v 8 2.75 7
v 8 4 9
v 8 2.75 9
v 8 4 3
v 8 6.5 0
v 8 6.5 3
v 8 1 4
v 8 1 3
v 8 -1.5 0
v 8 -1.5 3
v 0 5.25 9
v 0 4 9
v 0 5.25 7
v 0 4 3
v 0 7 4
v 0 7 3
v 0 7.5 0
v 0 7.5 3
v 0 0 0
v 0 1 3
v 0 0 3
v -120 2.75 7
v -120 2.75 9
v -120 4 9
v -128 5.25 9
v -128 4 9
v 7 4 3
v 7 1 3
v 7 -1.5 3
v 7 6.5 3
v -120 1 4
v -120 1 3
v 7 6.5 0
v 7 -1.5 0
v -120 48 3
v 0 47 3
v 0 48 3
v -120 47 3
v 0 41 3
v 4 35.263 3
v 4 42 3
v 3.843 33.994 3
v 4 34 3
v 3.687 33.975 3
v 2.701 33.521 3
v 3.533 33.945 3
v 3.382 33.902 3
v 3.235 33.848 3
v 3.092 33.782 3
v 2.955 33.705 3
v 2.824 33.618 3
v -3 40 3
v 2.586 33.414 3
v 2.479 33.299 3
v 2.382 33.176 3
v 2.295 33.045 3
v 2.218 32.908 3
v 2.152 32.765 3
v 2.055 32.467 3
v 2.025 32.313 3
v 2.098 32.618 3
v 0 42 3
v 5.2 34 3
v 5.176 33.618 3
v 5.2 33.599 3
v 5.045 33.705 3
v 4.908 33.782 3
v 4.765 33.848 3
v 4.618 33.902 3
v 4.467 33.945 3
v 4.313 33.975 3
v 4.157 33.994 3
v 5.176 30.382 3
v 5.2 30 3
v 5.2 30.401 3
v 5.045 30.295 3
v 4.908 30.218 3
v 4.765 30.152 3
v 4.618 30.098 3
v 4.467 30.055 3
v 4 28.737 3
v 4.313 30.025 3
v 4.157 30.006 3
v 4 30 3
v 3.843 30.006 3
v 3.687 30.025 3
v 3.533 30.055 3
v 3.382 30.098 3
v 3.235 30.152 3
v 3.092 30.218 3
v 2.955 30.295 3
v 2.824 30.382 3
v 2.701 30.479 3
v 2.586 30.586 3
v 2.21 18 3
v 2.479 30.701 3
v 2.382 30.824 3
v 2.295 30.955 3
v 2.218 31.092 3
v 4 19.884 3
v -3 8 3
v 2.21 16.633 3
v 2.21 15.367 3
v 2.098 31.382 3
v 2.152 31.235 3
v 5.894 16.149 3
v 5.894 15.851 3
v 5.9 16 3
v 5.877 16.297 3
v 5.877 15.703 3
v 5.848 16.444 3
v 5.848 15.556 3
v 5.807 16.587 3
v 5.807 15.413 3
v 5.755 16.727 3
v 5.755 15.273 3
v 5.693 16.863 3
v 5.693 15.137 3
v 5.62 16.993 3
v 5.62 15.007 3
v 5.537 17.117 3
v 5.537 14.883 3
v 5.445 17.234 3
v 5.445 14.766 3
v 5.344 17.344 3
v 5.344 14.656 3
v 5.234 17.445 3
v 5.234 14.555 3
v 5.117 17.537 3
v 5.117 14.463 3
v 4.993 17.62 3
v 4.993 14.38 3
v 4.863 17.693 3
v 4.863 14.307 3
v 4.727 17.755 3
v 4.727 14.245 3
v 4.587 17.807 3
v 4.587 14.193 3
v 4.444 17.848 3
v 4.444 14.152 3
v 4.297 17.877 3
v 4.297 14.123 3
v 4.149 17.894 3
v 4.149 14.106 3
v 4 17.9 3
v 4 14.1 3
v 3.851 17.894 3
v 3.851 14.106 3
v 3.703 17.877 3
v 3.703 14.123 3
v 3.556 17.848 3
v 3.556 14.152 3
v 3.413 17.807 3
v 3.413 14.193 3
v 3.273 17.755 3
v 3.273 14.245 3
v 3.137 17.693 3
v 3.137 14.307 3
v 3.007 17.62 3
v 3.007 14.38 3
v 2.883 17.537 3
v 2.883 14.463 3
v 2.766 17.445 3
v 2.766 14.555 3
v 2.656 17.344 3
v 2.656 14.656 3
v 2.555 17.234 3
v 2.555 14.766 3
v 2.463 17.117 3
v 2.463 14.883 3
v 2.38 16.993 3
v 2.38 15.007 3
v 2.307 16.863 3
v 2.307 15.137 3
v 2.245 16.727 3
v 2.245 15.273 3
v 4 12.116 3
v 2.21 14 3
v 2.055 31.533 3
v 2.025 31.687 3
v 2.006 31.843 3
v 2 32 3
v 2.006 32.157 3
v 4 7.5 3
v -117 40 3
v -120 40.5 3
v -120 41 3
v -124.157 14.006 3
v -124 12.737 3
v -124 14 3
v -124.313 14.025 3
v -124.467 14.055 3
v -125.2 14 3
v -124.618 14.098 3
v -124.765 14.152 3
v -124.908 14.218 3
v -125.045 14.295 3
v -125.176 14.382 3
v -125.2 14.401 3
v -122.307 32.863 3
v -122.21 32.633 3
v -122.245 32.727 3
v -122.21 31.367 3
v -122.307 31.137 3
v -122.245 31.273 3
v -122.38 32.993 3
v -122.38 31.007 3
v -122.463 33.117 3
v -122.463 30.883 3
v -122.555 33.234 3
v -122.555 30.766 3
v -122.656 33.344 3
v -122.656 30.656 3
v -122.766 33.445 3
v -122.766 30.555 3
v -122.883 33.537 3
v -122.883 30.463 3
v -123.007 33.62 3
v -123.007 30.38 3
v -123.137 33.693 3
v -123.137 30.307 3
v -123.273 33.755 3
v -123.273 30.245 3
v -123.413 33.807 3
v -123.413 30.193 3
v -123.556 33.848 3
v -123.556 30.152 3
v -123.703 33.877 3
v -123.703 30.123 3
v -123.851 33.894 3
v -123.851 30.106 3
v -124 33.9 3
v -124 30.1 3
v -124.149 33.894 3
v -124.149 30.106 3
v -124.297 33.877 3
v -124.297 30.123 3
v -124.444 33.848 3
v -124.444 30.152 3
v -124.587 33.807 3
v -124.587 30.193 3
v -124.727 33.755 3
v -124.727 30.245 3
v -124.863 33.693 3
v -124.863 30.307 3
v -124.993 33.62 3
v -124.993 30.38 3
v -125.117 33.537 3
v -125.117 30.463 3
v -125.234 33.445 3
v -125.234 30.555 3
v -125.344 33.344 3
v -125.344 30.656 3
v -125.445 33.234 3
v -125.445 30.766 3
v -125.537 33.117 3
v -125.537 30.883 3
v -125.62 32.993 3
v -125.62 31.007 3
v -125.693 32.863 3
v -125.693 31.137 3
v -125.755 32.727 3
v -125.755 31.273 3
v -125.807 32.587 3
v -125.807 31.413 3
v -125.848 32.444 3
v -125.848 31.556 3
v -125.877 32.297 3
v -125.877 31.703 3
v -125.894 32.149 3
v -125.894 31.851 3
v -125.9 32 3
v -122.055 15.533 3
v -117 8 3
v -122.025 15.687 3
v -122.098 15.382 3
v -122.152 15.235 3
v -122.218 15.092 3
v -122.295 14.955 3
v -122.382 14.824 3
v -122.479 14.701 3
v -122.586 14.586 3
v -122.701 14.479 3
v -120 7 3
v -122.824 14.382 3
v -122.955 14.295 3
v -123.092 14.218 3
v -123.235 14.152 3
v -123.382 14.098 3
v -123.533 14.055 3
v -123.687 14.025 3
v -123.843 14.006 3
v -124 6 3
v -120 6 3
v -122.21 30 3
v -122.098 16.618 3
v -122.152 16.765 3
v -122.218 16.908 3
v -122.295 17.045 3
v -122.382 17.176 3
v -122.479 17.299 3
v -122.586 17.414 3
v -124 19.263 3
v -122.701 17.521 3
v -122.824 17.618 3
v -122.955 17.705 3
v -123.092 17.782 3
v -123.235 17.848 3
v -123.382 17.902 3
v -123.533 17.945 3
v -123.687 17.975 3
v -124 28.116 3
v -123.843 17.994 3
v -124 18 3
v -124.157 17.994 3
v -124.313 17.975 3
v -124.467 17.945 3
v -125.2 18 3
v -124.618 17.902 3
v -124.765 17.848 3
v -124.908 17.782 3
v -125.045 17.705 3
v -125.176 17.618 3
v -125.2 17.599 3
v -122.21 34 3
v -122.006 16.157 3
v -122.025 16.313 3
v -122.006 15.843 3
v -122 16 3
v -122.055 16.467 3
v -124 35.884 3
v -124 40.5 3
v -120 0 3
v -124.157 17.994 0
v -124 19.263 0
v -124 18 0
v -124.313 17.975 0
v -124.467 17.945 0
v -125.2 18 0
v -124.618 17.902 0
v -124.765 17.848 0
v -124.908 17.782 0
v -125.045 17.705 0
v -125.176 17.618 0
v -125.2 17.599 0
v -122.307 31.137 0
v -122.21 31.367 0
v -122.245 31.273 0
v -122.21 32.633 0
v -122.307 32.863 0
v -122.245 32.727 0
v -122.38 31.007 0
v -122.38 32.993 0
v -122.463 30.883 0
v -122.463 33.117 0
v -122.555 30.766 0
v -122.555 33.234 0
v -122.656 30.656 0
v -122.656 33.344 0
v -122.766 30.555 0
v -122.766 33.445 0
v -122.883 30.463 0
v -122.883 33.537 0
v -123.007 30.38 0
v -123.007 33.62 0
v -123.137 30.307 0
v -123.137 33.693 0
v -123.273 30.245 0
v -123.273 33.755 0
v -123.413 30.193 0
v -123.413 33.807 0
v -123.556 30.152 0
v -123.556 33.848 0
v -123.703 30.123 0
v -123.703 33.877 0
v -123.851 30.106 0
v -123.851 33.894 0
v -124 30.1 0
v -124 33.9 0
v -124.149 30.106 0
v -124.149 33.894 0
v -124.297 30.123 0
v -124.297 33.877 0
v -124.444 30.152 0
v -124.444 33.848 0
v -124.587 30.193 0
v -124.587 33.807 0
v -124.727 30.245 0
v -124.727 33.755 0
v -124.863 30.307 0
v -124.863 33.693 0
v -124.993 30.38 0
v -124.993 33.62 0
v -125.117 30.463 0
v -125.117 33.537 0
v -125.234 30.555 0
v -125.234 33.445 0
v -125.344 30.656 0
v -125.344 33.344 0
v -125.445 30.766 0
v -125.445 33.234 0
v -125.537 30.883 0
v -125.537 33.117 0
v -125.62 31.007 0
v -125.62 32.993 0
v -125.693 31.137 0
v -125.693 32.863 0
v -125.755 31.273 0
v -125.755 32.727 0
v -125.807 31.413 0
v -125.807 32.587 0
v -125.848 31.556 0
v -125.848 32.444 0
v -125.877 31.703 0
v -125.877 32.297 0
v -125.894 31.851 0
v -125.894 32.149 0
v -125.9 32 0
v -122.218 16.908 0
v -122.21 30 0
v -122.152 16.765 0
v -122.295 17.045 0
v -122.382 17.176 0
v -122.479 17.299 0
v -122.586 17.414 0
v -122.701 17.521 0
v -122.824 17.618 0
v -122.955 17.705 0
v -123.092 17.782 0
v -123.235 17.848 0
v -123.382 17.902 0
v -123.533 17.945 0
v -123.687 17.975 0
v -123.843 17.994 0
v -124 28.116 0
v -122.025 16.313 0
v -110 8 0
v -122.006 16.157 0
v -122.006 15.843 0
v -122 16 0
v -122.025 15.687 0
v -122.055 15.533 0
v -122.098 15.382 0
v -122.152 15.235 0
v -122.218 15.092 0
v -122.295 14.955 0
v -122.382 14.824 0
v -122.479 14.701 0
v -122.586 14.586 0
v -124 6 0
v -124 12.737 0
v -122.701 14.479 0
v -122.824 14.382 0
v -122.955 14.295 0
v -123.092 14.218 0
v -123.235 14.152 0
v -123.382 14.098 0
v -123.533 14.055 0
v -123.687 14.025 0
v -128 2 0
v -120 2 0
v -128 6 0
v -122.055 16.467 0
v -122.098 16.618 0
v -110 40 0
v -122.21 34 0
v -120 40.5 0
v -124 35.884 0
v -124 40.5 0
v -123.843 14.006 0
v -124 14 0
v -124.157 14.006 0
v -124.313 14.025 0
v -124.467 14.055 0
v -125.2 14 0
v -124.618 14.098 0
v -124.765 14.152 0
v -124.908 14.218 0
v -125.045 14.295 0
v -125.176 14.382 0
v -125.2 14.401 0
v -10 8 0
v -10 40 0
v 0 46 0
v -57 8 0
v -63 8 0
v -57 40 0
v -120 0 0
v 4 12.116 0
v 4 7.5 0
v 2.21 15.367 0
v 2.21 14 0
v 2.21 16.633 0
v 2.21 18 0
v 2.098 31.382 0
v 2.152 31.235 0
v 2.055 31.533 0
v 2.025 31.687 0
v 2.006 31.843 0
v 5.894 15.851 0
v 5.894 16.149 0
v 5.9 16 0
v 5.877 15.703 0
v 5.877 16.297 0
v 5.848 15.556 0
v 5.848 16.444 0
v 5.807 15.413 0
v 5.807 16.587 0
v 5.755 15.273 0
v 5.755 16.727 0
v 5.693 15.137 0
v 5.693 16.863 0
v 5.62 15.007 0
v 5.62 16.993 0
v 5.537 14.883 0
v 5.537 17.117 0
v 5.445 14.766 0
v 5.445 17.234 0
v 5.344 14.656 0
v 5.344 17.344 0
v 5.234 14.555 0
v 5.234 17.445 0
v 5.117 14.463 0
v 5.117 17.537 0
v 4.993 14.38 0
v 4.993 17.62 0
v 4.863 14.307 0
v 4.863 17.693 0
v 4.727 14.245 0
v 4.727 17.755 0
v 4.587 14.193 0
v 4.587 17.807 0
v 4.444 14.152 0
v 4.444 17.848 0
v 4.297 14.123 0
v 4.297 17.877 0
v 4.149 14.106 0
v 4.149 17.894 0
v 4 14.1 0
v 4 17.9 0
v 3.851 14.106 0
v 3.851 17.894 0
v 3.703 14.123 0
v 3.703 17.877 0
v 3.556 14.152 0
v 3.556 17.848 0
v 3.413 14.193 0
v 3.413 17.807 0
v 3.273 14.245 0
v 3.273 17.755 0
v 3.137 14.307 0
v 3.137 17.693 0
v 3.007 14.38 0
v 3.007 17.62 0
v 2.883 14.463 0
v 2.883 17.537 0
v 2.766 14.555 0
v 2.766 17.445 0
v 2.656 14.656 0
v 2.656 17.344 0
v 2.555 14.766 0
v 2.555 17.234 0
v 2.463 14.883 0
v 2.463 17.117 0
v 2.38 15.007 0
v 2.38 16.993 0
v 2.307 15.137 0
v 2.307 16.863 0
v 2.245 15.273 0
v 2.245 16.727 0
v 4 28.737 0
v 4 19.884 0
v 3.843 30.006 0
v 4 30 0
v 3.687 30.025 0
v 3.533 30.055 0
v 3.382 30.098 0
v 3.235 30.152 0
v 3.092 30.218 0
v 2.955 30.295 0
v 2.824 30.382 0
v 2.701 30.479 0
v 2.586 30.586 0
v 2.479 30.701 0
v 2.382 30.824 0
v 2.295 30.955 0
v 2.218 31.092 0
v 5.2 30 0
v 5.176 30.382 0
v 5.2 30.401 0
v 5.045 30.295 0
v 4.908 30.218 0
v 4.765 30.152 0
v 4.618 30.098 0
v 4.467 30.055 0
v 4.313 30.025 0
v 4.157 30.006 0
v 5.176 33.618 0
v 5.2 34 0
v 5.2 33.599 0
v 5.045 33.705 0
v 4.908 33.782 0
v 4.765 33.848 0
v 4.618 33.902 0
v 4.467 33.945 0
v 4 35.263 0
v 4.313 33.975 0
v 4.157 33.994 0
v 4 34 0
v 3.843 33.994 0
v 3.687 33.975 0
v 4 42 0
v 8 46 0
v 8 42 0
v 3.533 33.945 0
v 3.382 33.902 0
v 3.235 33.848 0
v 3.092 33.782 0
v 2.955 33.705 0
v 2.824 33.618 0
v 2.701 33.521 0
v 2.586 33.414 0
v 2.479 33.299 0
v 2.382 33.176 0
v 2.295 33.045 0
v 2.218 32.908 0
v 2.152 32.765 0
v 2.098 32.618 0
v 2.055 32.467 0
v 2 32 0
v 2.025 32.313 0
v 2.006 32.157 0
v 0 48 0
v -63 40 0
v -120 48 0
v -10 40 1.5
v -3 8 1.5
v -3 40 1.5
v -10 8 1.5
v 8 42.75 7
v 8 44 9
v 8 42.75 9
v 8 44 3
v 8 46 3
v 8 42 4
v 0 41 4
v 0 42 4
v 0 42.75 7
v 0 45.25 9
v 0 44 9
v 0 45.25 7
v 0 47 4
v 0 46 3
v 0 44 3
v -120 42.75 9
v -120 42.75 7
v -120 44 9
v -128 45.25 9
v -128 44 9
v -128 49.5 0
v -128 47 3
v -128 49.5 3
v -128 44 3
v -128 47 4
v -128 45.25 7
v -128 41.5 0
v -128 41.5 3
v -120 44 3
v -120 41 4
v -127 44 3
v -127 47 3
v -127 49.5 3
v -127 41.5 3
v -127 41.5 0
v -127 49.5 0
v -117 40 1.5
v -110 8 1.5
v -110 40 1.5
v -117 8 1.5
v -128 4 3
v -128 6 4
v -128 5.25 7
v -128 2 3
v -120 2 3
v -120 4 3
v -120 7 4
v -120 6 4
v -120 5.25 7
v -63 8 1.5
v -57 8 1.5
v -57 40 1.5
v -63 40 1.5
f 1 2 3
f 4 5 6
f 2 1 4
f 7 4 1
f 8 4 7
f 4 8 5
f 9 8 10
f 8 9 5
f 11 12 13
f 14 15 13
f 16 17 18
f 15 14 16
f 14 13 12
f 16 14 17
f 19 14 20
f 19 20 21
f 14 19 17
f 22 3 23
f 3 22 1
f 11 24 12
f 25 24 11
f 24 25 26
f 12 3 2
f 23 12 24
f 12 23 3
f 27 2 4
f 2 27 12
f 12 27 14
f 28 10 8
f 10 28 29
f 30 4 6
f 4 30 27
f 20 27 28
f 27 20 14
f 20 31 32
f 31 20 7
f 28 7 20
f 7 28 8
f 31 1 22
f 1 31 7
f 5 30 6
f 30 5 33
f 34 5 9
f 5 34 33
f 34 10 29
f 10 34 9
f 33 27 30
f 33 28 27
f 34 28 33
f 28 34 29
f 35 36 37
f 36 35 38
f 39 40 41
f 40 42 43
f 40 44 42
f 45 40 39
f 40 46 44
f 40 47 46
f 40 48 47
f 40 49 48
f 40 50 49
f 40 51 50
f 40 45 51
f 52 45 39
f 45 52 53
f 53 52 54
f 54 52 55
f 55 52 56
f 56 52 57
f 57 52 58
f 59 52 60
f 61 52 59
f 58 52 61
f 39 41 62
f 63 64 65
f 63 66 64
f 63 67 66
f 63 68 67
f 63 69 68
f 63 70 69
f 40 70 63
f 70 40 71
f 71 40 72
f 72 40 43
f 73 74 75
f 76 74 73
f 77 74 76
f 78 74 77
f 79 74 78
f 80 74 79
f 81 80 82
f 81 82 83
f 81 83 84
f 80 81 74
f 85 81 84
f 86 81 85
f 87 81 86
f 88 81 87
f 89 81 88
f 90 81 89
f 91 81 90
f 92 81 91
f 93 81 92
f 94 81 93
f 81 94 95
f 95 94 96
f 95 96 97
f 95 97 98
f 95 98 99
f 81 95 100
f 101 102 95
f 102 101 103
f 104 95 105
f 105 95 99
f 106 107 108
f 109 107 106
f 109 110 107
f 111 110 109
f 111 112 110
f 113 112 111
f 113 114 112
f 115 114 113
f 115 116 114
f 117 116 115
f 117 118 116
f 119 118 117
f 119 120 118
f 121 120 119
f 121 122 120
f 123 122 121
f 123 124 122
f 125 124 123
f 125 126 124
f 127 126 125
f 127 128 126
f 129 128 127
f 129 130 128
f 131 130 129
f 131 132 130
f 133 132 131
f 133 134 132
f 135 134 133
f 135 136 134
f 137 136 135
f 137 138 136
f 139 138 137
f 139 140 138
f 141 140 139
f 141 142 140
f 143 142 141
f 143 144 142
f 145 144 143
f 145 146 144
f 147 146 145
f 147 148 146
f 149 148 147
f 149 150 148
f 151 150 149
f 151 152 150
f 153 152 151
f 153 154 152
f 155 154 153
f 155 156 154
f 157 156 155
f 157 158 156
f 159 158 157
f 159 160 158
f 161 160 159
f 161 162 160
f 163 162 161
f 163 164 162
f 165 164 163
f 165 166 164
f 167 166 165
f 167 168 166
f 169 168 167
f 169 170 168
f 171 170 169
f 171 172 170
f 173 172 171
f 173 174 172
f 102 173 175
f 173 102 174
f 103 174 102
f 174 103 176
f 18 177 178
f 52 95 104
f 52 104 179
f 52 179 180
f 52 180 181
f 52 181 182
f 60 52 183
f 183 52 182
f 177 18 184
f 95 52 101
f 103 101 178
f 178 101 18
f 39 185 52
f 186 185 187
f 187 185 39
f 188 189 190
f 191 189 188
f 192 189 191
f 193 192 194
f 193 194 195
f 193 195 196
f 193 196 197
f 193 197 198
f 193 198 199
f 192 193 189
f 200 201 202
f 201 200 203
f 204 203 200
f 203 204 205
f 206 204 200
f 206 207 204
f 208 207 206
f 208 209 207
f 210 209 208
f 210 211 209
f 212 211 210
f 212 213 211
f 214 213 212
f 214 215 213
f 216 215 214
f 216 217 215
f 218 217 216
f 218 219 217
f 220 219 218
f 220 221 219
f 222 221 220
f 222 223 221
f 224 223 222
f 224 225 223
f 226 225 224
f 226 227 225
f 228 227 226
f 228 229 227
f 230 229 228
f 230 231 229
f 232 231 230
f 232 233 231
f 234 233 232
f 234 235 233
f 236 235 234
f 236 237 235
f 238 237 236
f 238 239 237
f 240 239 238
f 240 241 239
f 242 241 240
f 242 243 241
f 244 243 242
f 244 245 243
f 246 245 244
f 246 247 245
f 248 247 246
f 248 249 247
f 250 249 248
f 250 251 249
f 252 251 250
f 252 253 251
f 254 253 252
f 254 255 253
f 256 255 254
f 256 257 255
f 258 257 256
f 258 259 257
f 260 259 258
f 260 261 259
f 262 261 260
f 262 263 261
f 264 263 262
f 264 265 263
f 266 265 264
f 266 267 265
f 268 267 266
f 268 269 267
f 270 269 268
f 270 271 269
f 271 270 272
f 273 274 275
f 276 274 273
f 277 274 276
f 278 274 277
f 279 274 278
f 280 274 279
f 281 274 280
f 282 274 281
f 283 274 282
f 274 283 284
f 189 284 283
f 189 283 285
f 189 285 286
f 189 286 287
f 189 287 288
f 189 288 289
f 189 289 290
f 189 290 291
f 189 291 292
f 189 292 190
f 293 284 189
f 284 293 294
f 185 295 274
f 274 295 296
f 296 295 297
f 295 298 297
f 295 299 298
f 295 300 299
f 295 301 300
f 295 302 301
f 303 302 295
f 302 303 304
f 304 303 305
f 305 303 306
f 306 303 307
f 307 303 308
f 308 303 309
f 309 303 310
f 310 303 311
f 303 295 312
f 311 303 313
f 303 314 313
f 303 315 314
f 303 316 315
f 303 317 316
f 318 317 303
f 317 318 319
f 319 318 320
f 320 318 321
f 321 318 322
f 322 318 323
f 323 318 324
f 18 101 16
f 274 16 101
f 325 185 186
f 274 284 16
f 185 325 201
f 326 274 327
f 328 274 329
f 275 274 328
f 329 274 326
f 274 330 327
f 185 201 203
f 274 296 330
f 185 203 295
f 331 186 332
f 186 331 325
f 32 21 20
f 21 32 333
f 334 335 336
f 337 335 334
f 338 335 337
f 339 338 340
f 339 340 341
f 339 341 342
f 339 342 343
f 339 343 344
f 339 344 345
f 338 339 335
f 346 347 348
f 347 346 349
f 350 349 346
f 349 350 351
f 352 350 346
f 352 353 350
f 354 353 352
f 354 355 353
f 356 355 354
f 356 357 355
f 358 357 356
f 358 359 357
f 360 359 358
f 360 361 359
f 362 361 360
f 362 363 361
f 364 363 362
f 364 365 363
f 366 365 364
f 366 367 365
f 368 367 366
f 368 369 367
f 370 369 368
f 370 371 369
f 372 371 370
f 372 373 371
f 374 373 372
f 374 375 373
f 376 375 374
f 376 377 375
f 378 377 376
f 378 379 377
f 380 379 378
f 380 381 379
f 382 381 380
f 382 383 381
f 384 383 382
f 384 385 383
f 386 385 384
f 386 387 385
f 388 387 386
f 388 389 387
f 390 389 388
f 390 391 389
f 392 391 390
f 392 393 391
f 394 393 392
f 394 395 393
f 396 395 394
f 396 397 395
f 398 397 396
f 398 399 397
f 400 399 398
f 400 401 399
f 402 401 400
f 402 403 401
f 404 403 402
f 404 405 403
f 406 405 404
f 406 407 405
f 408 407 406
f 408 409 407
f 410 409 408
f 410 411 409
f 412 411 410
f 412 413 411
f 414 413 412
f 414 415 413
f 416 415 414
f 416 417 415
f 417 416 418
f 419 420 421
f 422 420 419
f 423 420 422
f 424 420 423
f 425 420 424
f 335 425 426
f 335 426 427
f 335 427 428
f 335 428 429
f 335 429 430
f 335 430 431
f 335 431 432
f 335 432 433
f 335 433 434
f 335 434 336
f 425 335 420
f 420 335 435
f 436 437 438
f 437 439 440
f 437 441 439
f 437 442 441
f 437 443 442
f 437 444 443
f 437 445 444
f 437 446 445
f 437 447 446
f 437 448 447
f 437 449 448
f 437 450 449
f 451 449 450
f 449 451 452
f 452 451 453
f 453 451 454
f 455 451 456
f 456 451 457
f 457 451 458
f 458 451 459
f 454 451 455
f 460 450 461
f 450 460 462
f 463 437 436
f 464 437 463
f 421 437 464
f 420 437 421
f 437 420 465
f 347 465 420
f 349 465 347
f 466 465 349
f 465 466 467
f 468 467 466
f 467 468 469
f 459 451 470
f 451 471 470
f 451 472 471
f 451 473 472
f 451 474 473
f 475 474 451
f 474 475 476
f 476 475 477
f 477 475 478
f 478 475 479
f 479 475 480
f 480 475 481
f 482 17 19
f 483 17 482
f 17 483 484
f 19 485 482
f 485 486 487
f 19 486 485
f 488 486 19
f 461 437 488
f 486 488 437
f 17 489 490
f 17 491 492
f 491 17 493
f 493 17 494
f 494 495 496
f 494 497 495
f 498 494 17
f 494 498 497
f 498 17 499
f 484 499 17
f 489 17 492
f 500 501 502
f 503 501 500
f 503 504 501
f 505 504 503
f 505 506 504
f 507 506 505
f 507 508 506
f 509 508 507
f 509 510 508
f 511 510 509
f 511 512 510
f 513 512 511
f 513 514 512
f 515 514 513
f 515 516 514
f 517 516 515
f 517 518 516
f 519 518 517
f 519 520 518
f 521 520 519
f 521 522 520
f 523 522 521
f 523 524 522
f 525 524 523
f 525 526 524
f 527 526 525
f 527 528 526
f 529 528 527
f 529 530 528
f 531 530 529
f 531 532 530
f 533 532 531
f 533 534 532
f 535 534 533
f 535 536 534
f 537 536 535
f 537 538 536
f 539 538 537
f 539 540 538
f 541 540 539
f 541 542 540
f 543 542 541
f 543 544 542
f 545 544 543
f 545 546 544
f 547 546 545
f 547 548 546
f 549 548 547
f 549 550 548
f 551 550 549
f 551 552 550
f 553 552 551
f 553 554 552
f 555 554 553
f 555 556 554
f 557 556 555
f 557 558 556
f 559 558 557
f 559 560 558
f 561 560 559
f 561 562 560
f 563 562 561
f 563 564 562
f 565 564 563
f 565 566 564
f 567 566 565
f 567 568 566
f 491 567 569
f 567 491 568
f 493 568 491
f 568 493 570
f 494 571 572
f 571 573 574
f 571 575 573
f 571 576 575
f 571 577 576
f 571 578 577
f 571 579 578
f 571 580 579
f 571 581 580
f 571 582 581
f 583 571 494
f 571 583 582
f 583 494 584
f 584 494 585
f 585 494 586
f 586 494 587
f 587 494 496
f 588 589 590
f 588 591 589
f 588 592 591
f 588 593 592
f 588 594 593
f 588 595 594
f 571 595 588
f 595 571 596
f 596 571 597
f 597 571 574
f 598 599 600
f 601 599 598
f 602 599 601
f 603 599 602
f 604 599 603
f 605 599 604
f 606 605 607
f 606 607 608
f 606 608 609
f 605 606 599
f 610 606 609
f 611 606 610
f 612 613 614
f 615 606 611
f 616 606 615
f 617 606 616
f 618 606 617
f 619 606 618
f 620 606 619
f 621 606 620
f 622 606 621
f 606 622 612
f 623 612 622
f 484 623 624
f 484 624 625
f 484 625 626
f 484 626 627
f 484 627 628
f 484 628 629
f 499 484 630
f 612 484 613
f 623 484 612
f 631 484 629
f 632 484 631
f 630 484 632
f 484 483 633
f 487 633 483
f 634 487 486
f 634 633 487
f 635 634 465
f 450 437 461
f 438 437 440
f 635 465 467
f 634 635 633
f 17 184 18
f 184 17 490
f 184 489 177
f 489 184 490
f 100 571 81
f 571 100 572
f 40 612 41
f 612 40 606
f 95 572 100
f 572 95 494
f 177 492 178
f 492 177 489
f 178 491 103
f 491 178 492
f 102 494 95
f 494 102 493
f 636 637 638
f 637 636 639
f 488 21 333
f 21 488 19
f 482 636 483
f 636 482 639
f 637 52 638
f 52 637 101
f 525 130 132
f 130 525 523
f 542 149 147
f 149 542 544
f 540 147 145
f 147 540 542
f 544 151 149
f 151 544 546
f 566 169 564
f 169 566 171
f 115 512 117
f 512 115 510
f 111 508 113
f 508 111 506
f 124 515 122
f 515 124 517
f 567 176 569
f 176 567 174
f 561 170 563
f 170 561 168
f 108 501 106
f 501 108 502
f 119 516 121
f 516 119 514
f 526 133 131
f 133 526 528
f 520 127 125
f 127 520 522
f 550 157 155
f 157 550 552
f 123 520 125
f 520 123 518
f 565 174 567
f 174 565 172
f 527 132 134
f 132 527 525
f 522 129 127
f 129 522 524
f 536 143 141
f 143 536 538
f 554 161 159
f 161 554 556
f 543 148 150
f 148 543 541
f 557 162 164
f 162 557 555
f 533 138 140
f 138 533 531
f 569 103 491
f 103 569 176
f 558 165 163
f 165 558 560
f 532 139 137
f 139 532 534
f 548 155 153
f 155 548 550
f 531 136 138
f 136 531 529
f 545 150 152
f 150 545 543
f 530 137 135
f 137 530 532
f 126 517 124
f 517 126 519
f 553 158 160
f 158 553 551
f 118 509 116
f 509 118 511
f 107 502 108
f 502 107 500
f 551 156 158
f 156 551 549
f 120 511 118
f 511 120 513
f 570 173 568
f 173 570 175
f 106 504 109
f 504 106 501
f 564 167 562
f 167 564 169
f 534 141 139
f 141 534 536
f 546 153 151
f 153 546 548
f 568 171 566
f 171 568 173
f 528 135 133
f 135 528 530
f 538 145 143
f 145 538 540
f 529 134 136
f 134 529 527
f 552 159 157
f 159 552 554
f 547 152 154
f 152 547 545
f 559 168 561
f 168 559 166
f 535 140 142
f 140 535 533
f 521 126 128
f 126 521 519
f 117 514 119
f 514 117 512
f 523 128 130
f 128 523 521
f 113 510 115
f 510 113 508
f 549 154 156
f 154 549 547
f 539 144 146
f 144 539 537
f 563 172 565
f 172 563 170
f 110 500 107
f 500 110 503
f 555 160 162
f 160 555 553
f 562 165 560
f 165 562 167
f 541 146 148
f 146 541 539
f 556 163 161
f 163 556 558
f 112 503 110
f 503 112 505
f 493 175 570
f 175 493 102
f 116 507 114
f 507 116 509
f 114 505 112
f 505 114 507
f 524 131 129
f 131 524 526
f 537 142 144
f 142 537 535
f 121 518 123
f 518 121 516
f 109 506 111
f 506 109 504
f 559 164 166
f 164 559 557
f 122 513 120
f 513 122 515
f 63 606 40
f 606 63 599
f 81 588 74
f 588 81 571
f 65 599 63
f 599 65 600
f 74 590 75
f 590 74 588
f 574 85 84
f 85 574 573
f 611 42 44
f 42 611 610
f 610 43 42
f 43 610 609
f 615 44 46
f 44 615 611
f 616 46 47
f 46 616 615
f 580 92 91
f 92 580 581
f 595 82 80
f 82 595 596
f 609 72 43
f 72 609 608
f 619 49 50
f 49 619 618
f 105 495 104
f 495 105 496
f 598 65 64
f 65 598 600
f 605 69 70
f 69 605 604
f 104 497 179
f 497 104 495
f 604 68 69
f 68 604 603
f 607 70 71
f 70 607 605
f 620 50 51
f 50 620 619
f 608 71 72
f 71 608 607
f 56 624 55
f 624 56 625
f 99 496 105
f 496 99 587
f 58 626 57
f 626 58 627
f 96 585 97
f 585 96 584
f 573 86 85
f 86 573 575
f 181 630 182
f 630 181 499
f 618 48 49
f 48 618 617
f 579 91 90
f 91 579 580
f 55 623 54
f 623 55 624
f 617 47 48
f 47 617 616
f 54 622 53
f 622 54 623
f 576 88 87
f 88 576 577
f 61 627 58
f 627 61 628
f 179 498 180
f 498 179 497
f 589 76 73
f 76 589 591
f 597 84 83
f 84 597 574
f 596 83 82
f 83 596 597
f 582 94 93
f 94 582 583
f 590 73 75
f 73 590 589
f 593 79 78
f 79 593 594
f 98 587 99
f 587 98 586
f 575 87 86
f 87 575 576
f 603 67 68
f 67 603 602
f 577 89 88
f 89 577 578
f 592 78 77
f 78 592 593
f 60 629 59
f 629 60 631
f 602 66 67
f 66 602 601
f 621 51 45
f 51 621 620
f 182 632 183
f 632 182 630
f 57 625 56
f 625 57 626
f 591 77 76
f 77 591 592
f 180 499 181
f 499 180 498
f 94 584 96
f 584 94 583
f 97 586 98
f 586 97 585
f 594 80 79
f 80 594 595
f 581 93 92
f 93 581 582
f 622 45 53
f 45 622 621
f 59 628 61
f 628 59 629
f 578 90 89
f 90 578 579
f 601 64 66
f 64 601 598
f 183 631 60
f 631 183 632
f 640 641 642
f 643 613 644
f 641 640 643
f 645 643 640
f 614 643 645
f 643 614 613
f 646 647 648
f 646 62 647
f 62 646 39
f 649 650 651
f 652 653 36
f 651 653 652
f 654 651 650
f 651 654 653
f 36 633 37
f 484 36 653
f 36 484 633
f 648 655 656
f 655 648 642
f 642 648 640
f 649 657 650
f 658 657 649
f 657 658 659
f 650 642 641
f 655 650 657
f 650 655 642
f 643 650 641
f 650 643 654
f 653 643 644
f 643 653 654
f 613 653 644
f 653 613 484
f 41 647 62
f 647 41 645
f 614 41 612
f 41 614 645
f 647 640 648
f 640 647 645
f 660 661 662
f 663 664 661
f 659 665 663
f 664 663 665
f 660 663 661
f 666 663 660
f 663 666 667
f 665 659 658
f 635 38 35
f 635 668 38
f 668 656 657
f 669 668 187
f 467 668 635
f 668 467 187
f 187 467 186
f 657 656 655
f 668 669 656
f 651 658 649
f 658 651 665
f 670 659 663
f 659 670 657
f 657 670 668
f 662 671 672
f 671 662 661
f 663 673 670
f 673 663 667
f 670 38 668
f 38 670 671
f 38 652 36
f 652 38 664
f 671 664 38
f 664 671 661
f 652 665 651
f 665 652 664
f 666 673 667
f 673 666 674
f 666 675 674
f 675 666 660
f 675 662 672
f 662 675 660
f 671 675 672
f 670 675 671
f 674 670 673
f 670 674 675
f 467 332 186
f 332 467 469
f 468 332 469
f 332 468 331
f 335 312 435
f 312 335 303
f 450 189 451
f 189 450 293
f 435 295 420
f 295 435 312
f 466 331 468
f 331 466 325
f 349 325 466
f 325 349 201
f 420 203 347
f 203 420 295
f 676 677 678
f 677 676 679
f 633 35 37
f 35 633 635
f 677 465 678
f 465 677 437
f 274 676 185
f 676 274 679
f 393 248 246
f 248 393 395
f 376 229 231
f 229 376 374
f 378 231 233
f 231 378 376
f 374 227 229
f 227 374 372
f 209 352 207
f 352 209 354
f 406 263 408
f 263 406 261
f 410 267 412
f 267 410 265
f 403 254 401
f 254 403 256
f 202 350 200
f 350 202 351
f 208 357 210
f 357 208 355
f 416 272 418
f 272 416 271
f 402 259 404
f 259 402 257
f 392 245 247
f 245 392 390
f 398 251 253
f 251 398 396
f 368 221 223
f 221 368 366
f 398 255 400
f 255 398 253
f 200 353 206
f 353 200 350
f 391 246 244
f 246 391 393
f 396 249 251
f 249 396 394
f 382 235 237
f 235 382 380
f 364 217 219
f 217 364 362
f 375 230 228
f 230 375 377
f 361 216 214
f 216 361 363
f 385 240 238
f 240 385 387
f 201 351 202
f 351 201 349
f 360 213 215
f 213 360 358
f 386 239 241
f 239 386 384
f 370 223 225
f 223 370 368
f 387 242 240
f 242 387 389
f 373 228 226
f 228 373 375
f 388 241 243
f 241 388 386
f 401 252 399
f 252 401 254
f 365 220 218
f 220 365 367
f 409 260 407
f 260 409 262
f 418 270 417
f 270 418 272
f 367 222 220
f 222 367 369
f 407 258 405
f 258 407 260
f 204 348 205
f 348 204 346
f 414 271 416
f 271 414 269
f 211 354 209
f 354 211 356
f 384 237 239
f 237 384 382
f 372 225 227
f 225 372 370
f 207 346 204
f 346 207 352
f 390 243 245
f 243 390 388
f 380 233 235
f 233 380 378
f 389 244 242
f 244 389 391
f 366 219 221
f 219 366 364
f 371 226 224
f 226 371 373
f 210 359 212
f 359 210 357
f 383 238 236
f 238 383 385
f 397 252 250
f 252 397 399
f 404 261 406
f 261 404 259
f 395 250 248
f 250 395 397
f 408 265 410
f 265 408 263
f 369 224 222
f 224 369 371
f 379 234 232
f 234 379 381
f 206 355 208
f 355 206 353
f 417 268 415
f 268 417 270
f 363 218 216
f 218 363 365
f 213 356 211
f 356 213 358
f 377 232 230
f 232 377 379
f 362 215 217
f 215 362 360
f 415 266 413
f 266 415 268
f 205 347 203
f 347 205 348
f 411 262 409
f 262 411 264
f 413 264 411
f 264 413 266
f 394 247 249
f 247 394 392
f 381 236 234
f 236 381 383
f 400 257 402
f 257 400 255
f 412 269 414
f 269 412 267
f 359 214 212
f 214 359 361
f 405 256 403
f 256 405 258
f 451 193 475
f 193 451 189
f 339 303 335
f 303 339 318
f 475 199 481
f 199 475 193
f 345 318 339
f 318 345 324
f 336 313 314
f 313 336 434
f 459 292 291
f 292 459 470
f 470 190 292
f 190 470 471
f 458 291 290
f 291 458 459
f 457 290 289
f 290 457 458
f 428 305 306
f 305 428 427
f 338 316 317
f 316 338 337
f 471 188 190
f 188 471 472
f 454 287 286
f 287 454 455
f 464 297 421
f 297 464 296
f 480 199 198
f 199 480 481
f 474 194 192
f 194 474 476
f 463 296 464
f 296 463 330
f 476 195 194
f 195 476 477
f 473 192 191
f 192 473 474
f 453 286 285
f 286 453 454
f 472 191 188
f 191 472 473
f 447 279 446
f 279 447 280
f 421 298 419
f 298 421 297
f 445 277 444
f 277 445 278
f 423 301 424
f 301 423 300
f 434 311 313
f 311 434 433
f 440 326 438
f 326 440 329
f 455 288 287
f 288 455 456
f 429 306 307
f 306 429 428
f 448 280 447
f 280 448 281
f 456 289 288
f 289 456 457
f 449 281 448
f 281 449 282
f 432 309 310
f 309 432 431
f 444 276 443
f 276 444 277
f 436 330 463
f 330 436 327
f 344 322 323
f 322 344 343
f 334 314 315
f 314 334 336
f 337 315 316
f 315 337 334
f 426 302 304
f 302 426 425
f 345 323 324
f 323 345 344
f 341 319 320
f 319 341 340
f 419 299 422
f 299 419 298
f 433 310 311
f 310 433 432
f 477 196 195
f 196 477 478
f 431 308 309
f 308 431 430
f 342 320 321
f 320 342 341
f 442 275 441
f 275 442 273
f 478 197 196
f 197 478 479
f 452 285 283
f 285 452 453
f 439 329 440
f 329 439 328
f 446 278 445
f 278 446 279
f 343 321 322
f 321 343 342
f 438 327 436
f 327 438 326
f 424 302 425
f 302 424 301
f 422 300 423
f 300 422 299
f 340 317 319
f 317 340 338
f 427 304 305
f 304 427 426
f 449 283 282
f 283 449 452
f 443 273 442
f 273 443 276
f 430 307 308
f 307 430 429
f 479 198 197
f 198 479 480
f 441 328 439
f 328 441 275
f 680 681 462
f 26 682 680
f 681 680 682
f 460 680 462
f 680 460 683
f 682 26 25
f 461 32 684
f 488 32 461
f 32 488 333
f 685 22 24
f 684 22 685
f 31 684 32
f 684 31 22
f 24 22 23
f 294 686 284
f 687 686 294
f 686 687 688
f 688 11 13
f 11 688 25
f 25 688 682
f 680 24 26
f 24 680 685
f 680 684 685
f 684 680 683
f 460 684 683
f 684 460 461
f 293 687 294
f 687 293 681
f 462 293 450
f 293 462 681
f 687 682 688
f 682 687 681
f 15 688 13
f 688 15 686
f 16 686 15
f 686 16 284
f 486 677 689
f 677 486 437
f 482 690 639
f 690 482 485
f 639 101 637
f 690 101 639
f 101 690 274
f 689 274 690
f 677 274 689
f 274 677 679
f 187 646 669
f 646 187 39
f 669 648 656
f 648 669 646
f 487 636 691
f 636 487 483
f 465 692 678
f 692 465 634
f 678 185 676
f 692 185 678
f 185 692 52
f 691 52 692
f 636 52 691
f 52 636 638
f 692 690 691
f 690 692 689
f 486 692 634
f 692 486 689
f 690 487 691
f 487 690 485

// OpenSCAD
length = 120;

module rail_main(length) {
    poly = [[0,0],[0,8],[3,8],[3,7],[4,7],[7,5.25],[9,5.25],[9,2.75],[7,2.75],[4,1],[3,1],[3,0]];
    rotate([90,-90,180]) linear_extrude(length) polygon(poly);
}

module rail_endpoint_right() {
    poly = [[0,2],[0,6],[3,6],[3,4],[9,4],[9,2.75],[7,2.75],[4,2],[3,2]];
    rotate([90,-90,180]) linear_extrude(8) polygon(poly);
}

module rail_endpoint_left() {
    poly = [[3,8],[3,4],[9,4],[9,2.75],[7,2.75],[4,1],[3,1]];
    rotate([90,-90,180]) linear_extrude(8) polygon(poly);
    // support
    translate([-1.5,0,0]) cube([8,1,3], false);
}

module attach_poly(h) {
    linear_extrude(h) polygon([[0,0],[2,1.9],[6,1.9],[8,0]]);
}

module attach(l) {
    difference() {
        union() {
            cube([41,l,1.5], false);
            cube([41,3,3], false);
            difference() {
                translate ([7.5,-4,0]) cube([36,6,3], false);
                translate ([12,-4.11,-0.5]) attach_poly(4);
            }
            translate ([16,-4,0]) cylinder(3,1.90,1.90,false, $fn = 80);
            translate ([28,-3.3,0]) mirror([0,1,0]) attach_poly(3);
        }
        translate ([32,-4,-0.5]) cylinder(4,2,2,false, $fn = 80);
    }
}

module full_endpoint() {
    translate([0,-8,0]) rail_endpoint_left();
    translate([40,-8,0]) rail_endpoint_right();
    attach(10);
}

module barreau() {
    translate([8,0,0]) cube([36,6,1.5], false);
}

module main() {
    rail_main(length);
    translate([40,0,0]) rail_main(length);

    full_endpoint();

    translate([48,length,0]) rotate([180,180,0]) full_endpoint();

    translate([0,length/2-3,0]) barreau();
}

rotate([0,0,90]) main();
